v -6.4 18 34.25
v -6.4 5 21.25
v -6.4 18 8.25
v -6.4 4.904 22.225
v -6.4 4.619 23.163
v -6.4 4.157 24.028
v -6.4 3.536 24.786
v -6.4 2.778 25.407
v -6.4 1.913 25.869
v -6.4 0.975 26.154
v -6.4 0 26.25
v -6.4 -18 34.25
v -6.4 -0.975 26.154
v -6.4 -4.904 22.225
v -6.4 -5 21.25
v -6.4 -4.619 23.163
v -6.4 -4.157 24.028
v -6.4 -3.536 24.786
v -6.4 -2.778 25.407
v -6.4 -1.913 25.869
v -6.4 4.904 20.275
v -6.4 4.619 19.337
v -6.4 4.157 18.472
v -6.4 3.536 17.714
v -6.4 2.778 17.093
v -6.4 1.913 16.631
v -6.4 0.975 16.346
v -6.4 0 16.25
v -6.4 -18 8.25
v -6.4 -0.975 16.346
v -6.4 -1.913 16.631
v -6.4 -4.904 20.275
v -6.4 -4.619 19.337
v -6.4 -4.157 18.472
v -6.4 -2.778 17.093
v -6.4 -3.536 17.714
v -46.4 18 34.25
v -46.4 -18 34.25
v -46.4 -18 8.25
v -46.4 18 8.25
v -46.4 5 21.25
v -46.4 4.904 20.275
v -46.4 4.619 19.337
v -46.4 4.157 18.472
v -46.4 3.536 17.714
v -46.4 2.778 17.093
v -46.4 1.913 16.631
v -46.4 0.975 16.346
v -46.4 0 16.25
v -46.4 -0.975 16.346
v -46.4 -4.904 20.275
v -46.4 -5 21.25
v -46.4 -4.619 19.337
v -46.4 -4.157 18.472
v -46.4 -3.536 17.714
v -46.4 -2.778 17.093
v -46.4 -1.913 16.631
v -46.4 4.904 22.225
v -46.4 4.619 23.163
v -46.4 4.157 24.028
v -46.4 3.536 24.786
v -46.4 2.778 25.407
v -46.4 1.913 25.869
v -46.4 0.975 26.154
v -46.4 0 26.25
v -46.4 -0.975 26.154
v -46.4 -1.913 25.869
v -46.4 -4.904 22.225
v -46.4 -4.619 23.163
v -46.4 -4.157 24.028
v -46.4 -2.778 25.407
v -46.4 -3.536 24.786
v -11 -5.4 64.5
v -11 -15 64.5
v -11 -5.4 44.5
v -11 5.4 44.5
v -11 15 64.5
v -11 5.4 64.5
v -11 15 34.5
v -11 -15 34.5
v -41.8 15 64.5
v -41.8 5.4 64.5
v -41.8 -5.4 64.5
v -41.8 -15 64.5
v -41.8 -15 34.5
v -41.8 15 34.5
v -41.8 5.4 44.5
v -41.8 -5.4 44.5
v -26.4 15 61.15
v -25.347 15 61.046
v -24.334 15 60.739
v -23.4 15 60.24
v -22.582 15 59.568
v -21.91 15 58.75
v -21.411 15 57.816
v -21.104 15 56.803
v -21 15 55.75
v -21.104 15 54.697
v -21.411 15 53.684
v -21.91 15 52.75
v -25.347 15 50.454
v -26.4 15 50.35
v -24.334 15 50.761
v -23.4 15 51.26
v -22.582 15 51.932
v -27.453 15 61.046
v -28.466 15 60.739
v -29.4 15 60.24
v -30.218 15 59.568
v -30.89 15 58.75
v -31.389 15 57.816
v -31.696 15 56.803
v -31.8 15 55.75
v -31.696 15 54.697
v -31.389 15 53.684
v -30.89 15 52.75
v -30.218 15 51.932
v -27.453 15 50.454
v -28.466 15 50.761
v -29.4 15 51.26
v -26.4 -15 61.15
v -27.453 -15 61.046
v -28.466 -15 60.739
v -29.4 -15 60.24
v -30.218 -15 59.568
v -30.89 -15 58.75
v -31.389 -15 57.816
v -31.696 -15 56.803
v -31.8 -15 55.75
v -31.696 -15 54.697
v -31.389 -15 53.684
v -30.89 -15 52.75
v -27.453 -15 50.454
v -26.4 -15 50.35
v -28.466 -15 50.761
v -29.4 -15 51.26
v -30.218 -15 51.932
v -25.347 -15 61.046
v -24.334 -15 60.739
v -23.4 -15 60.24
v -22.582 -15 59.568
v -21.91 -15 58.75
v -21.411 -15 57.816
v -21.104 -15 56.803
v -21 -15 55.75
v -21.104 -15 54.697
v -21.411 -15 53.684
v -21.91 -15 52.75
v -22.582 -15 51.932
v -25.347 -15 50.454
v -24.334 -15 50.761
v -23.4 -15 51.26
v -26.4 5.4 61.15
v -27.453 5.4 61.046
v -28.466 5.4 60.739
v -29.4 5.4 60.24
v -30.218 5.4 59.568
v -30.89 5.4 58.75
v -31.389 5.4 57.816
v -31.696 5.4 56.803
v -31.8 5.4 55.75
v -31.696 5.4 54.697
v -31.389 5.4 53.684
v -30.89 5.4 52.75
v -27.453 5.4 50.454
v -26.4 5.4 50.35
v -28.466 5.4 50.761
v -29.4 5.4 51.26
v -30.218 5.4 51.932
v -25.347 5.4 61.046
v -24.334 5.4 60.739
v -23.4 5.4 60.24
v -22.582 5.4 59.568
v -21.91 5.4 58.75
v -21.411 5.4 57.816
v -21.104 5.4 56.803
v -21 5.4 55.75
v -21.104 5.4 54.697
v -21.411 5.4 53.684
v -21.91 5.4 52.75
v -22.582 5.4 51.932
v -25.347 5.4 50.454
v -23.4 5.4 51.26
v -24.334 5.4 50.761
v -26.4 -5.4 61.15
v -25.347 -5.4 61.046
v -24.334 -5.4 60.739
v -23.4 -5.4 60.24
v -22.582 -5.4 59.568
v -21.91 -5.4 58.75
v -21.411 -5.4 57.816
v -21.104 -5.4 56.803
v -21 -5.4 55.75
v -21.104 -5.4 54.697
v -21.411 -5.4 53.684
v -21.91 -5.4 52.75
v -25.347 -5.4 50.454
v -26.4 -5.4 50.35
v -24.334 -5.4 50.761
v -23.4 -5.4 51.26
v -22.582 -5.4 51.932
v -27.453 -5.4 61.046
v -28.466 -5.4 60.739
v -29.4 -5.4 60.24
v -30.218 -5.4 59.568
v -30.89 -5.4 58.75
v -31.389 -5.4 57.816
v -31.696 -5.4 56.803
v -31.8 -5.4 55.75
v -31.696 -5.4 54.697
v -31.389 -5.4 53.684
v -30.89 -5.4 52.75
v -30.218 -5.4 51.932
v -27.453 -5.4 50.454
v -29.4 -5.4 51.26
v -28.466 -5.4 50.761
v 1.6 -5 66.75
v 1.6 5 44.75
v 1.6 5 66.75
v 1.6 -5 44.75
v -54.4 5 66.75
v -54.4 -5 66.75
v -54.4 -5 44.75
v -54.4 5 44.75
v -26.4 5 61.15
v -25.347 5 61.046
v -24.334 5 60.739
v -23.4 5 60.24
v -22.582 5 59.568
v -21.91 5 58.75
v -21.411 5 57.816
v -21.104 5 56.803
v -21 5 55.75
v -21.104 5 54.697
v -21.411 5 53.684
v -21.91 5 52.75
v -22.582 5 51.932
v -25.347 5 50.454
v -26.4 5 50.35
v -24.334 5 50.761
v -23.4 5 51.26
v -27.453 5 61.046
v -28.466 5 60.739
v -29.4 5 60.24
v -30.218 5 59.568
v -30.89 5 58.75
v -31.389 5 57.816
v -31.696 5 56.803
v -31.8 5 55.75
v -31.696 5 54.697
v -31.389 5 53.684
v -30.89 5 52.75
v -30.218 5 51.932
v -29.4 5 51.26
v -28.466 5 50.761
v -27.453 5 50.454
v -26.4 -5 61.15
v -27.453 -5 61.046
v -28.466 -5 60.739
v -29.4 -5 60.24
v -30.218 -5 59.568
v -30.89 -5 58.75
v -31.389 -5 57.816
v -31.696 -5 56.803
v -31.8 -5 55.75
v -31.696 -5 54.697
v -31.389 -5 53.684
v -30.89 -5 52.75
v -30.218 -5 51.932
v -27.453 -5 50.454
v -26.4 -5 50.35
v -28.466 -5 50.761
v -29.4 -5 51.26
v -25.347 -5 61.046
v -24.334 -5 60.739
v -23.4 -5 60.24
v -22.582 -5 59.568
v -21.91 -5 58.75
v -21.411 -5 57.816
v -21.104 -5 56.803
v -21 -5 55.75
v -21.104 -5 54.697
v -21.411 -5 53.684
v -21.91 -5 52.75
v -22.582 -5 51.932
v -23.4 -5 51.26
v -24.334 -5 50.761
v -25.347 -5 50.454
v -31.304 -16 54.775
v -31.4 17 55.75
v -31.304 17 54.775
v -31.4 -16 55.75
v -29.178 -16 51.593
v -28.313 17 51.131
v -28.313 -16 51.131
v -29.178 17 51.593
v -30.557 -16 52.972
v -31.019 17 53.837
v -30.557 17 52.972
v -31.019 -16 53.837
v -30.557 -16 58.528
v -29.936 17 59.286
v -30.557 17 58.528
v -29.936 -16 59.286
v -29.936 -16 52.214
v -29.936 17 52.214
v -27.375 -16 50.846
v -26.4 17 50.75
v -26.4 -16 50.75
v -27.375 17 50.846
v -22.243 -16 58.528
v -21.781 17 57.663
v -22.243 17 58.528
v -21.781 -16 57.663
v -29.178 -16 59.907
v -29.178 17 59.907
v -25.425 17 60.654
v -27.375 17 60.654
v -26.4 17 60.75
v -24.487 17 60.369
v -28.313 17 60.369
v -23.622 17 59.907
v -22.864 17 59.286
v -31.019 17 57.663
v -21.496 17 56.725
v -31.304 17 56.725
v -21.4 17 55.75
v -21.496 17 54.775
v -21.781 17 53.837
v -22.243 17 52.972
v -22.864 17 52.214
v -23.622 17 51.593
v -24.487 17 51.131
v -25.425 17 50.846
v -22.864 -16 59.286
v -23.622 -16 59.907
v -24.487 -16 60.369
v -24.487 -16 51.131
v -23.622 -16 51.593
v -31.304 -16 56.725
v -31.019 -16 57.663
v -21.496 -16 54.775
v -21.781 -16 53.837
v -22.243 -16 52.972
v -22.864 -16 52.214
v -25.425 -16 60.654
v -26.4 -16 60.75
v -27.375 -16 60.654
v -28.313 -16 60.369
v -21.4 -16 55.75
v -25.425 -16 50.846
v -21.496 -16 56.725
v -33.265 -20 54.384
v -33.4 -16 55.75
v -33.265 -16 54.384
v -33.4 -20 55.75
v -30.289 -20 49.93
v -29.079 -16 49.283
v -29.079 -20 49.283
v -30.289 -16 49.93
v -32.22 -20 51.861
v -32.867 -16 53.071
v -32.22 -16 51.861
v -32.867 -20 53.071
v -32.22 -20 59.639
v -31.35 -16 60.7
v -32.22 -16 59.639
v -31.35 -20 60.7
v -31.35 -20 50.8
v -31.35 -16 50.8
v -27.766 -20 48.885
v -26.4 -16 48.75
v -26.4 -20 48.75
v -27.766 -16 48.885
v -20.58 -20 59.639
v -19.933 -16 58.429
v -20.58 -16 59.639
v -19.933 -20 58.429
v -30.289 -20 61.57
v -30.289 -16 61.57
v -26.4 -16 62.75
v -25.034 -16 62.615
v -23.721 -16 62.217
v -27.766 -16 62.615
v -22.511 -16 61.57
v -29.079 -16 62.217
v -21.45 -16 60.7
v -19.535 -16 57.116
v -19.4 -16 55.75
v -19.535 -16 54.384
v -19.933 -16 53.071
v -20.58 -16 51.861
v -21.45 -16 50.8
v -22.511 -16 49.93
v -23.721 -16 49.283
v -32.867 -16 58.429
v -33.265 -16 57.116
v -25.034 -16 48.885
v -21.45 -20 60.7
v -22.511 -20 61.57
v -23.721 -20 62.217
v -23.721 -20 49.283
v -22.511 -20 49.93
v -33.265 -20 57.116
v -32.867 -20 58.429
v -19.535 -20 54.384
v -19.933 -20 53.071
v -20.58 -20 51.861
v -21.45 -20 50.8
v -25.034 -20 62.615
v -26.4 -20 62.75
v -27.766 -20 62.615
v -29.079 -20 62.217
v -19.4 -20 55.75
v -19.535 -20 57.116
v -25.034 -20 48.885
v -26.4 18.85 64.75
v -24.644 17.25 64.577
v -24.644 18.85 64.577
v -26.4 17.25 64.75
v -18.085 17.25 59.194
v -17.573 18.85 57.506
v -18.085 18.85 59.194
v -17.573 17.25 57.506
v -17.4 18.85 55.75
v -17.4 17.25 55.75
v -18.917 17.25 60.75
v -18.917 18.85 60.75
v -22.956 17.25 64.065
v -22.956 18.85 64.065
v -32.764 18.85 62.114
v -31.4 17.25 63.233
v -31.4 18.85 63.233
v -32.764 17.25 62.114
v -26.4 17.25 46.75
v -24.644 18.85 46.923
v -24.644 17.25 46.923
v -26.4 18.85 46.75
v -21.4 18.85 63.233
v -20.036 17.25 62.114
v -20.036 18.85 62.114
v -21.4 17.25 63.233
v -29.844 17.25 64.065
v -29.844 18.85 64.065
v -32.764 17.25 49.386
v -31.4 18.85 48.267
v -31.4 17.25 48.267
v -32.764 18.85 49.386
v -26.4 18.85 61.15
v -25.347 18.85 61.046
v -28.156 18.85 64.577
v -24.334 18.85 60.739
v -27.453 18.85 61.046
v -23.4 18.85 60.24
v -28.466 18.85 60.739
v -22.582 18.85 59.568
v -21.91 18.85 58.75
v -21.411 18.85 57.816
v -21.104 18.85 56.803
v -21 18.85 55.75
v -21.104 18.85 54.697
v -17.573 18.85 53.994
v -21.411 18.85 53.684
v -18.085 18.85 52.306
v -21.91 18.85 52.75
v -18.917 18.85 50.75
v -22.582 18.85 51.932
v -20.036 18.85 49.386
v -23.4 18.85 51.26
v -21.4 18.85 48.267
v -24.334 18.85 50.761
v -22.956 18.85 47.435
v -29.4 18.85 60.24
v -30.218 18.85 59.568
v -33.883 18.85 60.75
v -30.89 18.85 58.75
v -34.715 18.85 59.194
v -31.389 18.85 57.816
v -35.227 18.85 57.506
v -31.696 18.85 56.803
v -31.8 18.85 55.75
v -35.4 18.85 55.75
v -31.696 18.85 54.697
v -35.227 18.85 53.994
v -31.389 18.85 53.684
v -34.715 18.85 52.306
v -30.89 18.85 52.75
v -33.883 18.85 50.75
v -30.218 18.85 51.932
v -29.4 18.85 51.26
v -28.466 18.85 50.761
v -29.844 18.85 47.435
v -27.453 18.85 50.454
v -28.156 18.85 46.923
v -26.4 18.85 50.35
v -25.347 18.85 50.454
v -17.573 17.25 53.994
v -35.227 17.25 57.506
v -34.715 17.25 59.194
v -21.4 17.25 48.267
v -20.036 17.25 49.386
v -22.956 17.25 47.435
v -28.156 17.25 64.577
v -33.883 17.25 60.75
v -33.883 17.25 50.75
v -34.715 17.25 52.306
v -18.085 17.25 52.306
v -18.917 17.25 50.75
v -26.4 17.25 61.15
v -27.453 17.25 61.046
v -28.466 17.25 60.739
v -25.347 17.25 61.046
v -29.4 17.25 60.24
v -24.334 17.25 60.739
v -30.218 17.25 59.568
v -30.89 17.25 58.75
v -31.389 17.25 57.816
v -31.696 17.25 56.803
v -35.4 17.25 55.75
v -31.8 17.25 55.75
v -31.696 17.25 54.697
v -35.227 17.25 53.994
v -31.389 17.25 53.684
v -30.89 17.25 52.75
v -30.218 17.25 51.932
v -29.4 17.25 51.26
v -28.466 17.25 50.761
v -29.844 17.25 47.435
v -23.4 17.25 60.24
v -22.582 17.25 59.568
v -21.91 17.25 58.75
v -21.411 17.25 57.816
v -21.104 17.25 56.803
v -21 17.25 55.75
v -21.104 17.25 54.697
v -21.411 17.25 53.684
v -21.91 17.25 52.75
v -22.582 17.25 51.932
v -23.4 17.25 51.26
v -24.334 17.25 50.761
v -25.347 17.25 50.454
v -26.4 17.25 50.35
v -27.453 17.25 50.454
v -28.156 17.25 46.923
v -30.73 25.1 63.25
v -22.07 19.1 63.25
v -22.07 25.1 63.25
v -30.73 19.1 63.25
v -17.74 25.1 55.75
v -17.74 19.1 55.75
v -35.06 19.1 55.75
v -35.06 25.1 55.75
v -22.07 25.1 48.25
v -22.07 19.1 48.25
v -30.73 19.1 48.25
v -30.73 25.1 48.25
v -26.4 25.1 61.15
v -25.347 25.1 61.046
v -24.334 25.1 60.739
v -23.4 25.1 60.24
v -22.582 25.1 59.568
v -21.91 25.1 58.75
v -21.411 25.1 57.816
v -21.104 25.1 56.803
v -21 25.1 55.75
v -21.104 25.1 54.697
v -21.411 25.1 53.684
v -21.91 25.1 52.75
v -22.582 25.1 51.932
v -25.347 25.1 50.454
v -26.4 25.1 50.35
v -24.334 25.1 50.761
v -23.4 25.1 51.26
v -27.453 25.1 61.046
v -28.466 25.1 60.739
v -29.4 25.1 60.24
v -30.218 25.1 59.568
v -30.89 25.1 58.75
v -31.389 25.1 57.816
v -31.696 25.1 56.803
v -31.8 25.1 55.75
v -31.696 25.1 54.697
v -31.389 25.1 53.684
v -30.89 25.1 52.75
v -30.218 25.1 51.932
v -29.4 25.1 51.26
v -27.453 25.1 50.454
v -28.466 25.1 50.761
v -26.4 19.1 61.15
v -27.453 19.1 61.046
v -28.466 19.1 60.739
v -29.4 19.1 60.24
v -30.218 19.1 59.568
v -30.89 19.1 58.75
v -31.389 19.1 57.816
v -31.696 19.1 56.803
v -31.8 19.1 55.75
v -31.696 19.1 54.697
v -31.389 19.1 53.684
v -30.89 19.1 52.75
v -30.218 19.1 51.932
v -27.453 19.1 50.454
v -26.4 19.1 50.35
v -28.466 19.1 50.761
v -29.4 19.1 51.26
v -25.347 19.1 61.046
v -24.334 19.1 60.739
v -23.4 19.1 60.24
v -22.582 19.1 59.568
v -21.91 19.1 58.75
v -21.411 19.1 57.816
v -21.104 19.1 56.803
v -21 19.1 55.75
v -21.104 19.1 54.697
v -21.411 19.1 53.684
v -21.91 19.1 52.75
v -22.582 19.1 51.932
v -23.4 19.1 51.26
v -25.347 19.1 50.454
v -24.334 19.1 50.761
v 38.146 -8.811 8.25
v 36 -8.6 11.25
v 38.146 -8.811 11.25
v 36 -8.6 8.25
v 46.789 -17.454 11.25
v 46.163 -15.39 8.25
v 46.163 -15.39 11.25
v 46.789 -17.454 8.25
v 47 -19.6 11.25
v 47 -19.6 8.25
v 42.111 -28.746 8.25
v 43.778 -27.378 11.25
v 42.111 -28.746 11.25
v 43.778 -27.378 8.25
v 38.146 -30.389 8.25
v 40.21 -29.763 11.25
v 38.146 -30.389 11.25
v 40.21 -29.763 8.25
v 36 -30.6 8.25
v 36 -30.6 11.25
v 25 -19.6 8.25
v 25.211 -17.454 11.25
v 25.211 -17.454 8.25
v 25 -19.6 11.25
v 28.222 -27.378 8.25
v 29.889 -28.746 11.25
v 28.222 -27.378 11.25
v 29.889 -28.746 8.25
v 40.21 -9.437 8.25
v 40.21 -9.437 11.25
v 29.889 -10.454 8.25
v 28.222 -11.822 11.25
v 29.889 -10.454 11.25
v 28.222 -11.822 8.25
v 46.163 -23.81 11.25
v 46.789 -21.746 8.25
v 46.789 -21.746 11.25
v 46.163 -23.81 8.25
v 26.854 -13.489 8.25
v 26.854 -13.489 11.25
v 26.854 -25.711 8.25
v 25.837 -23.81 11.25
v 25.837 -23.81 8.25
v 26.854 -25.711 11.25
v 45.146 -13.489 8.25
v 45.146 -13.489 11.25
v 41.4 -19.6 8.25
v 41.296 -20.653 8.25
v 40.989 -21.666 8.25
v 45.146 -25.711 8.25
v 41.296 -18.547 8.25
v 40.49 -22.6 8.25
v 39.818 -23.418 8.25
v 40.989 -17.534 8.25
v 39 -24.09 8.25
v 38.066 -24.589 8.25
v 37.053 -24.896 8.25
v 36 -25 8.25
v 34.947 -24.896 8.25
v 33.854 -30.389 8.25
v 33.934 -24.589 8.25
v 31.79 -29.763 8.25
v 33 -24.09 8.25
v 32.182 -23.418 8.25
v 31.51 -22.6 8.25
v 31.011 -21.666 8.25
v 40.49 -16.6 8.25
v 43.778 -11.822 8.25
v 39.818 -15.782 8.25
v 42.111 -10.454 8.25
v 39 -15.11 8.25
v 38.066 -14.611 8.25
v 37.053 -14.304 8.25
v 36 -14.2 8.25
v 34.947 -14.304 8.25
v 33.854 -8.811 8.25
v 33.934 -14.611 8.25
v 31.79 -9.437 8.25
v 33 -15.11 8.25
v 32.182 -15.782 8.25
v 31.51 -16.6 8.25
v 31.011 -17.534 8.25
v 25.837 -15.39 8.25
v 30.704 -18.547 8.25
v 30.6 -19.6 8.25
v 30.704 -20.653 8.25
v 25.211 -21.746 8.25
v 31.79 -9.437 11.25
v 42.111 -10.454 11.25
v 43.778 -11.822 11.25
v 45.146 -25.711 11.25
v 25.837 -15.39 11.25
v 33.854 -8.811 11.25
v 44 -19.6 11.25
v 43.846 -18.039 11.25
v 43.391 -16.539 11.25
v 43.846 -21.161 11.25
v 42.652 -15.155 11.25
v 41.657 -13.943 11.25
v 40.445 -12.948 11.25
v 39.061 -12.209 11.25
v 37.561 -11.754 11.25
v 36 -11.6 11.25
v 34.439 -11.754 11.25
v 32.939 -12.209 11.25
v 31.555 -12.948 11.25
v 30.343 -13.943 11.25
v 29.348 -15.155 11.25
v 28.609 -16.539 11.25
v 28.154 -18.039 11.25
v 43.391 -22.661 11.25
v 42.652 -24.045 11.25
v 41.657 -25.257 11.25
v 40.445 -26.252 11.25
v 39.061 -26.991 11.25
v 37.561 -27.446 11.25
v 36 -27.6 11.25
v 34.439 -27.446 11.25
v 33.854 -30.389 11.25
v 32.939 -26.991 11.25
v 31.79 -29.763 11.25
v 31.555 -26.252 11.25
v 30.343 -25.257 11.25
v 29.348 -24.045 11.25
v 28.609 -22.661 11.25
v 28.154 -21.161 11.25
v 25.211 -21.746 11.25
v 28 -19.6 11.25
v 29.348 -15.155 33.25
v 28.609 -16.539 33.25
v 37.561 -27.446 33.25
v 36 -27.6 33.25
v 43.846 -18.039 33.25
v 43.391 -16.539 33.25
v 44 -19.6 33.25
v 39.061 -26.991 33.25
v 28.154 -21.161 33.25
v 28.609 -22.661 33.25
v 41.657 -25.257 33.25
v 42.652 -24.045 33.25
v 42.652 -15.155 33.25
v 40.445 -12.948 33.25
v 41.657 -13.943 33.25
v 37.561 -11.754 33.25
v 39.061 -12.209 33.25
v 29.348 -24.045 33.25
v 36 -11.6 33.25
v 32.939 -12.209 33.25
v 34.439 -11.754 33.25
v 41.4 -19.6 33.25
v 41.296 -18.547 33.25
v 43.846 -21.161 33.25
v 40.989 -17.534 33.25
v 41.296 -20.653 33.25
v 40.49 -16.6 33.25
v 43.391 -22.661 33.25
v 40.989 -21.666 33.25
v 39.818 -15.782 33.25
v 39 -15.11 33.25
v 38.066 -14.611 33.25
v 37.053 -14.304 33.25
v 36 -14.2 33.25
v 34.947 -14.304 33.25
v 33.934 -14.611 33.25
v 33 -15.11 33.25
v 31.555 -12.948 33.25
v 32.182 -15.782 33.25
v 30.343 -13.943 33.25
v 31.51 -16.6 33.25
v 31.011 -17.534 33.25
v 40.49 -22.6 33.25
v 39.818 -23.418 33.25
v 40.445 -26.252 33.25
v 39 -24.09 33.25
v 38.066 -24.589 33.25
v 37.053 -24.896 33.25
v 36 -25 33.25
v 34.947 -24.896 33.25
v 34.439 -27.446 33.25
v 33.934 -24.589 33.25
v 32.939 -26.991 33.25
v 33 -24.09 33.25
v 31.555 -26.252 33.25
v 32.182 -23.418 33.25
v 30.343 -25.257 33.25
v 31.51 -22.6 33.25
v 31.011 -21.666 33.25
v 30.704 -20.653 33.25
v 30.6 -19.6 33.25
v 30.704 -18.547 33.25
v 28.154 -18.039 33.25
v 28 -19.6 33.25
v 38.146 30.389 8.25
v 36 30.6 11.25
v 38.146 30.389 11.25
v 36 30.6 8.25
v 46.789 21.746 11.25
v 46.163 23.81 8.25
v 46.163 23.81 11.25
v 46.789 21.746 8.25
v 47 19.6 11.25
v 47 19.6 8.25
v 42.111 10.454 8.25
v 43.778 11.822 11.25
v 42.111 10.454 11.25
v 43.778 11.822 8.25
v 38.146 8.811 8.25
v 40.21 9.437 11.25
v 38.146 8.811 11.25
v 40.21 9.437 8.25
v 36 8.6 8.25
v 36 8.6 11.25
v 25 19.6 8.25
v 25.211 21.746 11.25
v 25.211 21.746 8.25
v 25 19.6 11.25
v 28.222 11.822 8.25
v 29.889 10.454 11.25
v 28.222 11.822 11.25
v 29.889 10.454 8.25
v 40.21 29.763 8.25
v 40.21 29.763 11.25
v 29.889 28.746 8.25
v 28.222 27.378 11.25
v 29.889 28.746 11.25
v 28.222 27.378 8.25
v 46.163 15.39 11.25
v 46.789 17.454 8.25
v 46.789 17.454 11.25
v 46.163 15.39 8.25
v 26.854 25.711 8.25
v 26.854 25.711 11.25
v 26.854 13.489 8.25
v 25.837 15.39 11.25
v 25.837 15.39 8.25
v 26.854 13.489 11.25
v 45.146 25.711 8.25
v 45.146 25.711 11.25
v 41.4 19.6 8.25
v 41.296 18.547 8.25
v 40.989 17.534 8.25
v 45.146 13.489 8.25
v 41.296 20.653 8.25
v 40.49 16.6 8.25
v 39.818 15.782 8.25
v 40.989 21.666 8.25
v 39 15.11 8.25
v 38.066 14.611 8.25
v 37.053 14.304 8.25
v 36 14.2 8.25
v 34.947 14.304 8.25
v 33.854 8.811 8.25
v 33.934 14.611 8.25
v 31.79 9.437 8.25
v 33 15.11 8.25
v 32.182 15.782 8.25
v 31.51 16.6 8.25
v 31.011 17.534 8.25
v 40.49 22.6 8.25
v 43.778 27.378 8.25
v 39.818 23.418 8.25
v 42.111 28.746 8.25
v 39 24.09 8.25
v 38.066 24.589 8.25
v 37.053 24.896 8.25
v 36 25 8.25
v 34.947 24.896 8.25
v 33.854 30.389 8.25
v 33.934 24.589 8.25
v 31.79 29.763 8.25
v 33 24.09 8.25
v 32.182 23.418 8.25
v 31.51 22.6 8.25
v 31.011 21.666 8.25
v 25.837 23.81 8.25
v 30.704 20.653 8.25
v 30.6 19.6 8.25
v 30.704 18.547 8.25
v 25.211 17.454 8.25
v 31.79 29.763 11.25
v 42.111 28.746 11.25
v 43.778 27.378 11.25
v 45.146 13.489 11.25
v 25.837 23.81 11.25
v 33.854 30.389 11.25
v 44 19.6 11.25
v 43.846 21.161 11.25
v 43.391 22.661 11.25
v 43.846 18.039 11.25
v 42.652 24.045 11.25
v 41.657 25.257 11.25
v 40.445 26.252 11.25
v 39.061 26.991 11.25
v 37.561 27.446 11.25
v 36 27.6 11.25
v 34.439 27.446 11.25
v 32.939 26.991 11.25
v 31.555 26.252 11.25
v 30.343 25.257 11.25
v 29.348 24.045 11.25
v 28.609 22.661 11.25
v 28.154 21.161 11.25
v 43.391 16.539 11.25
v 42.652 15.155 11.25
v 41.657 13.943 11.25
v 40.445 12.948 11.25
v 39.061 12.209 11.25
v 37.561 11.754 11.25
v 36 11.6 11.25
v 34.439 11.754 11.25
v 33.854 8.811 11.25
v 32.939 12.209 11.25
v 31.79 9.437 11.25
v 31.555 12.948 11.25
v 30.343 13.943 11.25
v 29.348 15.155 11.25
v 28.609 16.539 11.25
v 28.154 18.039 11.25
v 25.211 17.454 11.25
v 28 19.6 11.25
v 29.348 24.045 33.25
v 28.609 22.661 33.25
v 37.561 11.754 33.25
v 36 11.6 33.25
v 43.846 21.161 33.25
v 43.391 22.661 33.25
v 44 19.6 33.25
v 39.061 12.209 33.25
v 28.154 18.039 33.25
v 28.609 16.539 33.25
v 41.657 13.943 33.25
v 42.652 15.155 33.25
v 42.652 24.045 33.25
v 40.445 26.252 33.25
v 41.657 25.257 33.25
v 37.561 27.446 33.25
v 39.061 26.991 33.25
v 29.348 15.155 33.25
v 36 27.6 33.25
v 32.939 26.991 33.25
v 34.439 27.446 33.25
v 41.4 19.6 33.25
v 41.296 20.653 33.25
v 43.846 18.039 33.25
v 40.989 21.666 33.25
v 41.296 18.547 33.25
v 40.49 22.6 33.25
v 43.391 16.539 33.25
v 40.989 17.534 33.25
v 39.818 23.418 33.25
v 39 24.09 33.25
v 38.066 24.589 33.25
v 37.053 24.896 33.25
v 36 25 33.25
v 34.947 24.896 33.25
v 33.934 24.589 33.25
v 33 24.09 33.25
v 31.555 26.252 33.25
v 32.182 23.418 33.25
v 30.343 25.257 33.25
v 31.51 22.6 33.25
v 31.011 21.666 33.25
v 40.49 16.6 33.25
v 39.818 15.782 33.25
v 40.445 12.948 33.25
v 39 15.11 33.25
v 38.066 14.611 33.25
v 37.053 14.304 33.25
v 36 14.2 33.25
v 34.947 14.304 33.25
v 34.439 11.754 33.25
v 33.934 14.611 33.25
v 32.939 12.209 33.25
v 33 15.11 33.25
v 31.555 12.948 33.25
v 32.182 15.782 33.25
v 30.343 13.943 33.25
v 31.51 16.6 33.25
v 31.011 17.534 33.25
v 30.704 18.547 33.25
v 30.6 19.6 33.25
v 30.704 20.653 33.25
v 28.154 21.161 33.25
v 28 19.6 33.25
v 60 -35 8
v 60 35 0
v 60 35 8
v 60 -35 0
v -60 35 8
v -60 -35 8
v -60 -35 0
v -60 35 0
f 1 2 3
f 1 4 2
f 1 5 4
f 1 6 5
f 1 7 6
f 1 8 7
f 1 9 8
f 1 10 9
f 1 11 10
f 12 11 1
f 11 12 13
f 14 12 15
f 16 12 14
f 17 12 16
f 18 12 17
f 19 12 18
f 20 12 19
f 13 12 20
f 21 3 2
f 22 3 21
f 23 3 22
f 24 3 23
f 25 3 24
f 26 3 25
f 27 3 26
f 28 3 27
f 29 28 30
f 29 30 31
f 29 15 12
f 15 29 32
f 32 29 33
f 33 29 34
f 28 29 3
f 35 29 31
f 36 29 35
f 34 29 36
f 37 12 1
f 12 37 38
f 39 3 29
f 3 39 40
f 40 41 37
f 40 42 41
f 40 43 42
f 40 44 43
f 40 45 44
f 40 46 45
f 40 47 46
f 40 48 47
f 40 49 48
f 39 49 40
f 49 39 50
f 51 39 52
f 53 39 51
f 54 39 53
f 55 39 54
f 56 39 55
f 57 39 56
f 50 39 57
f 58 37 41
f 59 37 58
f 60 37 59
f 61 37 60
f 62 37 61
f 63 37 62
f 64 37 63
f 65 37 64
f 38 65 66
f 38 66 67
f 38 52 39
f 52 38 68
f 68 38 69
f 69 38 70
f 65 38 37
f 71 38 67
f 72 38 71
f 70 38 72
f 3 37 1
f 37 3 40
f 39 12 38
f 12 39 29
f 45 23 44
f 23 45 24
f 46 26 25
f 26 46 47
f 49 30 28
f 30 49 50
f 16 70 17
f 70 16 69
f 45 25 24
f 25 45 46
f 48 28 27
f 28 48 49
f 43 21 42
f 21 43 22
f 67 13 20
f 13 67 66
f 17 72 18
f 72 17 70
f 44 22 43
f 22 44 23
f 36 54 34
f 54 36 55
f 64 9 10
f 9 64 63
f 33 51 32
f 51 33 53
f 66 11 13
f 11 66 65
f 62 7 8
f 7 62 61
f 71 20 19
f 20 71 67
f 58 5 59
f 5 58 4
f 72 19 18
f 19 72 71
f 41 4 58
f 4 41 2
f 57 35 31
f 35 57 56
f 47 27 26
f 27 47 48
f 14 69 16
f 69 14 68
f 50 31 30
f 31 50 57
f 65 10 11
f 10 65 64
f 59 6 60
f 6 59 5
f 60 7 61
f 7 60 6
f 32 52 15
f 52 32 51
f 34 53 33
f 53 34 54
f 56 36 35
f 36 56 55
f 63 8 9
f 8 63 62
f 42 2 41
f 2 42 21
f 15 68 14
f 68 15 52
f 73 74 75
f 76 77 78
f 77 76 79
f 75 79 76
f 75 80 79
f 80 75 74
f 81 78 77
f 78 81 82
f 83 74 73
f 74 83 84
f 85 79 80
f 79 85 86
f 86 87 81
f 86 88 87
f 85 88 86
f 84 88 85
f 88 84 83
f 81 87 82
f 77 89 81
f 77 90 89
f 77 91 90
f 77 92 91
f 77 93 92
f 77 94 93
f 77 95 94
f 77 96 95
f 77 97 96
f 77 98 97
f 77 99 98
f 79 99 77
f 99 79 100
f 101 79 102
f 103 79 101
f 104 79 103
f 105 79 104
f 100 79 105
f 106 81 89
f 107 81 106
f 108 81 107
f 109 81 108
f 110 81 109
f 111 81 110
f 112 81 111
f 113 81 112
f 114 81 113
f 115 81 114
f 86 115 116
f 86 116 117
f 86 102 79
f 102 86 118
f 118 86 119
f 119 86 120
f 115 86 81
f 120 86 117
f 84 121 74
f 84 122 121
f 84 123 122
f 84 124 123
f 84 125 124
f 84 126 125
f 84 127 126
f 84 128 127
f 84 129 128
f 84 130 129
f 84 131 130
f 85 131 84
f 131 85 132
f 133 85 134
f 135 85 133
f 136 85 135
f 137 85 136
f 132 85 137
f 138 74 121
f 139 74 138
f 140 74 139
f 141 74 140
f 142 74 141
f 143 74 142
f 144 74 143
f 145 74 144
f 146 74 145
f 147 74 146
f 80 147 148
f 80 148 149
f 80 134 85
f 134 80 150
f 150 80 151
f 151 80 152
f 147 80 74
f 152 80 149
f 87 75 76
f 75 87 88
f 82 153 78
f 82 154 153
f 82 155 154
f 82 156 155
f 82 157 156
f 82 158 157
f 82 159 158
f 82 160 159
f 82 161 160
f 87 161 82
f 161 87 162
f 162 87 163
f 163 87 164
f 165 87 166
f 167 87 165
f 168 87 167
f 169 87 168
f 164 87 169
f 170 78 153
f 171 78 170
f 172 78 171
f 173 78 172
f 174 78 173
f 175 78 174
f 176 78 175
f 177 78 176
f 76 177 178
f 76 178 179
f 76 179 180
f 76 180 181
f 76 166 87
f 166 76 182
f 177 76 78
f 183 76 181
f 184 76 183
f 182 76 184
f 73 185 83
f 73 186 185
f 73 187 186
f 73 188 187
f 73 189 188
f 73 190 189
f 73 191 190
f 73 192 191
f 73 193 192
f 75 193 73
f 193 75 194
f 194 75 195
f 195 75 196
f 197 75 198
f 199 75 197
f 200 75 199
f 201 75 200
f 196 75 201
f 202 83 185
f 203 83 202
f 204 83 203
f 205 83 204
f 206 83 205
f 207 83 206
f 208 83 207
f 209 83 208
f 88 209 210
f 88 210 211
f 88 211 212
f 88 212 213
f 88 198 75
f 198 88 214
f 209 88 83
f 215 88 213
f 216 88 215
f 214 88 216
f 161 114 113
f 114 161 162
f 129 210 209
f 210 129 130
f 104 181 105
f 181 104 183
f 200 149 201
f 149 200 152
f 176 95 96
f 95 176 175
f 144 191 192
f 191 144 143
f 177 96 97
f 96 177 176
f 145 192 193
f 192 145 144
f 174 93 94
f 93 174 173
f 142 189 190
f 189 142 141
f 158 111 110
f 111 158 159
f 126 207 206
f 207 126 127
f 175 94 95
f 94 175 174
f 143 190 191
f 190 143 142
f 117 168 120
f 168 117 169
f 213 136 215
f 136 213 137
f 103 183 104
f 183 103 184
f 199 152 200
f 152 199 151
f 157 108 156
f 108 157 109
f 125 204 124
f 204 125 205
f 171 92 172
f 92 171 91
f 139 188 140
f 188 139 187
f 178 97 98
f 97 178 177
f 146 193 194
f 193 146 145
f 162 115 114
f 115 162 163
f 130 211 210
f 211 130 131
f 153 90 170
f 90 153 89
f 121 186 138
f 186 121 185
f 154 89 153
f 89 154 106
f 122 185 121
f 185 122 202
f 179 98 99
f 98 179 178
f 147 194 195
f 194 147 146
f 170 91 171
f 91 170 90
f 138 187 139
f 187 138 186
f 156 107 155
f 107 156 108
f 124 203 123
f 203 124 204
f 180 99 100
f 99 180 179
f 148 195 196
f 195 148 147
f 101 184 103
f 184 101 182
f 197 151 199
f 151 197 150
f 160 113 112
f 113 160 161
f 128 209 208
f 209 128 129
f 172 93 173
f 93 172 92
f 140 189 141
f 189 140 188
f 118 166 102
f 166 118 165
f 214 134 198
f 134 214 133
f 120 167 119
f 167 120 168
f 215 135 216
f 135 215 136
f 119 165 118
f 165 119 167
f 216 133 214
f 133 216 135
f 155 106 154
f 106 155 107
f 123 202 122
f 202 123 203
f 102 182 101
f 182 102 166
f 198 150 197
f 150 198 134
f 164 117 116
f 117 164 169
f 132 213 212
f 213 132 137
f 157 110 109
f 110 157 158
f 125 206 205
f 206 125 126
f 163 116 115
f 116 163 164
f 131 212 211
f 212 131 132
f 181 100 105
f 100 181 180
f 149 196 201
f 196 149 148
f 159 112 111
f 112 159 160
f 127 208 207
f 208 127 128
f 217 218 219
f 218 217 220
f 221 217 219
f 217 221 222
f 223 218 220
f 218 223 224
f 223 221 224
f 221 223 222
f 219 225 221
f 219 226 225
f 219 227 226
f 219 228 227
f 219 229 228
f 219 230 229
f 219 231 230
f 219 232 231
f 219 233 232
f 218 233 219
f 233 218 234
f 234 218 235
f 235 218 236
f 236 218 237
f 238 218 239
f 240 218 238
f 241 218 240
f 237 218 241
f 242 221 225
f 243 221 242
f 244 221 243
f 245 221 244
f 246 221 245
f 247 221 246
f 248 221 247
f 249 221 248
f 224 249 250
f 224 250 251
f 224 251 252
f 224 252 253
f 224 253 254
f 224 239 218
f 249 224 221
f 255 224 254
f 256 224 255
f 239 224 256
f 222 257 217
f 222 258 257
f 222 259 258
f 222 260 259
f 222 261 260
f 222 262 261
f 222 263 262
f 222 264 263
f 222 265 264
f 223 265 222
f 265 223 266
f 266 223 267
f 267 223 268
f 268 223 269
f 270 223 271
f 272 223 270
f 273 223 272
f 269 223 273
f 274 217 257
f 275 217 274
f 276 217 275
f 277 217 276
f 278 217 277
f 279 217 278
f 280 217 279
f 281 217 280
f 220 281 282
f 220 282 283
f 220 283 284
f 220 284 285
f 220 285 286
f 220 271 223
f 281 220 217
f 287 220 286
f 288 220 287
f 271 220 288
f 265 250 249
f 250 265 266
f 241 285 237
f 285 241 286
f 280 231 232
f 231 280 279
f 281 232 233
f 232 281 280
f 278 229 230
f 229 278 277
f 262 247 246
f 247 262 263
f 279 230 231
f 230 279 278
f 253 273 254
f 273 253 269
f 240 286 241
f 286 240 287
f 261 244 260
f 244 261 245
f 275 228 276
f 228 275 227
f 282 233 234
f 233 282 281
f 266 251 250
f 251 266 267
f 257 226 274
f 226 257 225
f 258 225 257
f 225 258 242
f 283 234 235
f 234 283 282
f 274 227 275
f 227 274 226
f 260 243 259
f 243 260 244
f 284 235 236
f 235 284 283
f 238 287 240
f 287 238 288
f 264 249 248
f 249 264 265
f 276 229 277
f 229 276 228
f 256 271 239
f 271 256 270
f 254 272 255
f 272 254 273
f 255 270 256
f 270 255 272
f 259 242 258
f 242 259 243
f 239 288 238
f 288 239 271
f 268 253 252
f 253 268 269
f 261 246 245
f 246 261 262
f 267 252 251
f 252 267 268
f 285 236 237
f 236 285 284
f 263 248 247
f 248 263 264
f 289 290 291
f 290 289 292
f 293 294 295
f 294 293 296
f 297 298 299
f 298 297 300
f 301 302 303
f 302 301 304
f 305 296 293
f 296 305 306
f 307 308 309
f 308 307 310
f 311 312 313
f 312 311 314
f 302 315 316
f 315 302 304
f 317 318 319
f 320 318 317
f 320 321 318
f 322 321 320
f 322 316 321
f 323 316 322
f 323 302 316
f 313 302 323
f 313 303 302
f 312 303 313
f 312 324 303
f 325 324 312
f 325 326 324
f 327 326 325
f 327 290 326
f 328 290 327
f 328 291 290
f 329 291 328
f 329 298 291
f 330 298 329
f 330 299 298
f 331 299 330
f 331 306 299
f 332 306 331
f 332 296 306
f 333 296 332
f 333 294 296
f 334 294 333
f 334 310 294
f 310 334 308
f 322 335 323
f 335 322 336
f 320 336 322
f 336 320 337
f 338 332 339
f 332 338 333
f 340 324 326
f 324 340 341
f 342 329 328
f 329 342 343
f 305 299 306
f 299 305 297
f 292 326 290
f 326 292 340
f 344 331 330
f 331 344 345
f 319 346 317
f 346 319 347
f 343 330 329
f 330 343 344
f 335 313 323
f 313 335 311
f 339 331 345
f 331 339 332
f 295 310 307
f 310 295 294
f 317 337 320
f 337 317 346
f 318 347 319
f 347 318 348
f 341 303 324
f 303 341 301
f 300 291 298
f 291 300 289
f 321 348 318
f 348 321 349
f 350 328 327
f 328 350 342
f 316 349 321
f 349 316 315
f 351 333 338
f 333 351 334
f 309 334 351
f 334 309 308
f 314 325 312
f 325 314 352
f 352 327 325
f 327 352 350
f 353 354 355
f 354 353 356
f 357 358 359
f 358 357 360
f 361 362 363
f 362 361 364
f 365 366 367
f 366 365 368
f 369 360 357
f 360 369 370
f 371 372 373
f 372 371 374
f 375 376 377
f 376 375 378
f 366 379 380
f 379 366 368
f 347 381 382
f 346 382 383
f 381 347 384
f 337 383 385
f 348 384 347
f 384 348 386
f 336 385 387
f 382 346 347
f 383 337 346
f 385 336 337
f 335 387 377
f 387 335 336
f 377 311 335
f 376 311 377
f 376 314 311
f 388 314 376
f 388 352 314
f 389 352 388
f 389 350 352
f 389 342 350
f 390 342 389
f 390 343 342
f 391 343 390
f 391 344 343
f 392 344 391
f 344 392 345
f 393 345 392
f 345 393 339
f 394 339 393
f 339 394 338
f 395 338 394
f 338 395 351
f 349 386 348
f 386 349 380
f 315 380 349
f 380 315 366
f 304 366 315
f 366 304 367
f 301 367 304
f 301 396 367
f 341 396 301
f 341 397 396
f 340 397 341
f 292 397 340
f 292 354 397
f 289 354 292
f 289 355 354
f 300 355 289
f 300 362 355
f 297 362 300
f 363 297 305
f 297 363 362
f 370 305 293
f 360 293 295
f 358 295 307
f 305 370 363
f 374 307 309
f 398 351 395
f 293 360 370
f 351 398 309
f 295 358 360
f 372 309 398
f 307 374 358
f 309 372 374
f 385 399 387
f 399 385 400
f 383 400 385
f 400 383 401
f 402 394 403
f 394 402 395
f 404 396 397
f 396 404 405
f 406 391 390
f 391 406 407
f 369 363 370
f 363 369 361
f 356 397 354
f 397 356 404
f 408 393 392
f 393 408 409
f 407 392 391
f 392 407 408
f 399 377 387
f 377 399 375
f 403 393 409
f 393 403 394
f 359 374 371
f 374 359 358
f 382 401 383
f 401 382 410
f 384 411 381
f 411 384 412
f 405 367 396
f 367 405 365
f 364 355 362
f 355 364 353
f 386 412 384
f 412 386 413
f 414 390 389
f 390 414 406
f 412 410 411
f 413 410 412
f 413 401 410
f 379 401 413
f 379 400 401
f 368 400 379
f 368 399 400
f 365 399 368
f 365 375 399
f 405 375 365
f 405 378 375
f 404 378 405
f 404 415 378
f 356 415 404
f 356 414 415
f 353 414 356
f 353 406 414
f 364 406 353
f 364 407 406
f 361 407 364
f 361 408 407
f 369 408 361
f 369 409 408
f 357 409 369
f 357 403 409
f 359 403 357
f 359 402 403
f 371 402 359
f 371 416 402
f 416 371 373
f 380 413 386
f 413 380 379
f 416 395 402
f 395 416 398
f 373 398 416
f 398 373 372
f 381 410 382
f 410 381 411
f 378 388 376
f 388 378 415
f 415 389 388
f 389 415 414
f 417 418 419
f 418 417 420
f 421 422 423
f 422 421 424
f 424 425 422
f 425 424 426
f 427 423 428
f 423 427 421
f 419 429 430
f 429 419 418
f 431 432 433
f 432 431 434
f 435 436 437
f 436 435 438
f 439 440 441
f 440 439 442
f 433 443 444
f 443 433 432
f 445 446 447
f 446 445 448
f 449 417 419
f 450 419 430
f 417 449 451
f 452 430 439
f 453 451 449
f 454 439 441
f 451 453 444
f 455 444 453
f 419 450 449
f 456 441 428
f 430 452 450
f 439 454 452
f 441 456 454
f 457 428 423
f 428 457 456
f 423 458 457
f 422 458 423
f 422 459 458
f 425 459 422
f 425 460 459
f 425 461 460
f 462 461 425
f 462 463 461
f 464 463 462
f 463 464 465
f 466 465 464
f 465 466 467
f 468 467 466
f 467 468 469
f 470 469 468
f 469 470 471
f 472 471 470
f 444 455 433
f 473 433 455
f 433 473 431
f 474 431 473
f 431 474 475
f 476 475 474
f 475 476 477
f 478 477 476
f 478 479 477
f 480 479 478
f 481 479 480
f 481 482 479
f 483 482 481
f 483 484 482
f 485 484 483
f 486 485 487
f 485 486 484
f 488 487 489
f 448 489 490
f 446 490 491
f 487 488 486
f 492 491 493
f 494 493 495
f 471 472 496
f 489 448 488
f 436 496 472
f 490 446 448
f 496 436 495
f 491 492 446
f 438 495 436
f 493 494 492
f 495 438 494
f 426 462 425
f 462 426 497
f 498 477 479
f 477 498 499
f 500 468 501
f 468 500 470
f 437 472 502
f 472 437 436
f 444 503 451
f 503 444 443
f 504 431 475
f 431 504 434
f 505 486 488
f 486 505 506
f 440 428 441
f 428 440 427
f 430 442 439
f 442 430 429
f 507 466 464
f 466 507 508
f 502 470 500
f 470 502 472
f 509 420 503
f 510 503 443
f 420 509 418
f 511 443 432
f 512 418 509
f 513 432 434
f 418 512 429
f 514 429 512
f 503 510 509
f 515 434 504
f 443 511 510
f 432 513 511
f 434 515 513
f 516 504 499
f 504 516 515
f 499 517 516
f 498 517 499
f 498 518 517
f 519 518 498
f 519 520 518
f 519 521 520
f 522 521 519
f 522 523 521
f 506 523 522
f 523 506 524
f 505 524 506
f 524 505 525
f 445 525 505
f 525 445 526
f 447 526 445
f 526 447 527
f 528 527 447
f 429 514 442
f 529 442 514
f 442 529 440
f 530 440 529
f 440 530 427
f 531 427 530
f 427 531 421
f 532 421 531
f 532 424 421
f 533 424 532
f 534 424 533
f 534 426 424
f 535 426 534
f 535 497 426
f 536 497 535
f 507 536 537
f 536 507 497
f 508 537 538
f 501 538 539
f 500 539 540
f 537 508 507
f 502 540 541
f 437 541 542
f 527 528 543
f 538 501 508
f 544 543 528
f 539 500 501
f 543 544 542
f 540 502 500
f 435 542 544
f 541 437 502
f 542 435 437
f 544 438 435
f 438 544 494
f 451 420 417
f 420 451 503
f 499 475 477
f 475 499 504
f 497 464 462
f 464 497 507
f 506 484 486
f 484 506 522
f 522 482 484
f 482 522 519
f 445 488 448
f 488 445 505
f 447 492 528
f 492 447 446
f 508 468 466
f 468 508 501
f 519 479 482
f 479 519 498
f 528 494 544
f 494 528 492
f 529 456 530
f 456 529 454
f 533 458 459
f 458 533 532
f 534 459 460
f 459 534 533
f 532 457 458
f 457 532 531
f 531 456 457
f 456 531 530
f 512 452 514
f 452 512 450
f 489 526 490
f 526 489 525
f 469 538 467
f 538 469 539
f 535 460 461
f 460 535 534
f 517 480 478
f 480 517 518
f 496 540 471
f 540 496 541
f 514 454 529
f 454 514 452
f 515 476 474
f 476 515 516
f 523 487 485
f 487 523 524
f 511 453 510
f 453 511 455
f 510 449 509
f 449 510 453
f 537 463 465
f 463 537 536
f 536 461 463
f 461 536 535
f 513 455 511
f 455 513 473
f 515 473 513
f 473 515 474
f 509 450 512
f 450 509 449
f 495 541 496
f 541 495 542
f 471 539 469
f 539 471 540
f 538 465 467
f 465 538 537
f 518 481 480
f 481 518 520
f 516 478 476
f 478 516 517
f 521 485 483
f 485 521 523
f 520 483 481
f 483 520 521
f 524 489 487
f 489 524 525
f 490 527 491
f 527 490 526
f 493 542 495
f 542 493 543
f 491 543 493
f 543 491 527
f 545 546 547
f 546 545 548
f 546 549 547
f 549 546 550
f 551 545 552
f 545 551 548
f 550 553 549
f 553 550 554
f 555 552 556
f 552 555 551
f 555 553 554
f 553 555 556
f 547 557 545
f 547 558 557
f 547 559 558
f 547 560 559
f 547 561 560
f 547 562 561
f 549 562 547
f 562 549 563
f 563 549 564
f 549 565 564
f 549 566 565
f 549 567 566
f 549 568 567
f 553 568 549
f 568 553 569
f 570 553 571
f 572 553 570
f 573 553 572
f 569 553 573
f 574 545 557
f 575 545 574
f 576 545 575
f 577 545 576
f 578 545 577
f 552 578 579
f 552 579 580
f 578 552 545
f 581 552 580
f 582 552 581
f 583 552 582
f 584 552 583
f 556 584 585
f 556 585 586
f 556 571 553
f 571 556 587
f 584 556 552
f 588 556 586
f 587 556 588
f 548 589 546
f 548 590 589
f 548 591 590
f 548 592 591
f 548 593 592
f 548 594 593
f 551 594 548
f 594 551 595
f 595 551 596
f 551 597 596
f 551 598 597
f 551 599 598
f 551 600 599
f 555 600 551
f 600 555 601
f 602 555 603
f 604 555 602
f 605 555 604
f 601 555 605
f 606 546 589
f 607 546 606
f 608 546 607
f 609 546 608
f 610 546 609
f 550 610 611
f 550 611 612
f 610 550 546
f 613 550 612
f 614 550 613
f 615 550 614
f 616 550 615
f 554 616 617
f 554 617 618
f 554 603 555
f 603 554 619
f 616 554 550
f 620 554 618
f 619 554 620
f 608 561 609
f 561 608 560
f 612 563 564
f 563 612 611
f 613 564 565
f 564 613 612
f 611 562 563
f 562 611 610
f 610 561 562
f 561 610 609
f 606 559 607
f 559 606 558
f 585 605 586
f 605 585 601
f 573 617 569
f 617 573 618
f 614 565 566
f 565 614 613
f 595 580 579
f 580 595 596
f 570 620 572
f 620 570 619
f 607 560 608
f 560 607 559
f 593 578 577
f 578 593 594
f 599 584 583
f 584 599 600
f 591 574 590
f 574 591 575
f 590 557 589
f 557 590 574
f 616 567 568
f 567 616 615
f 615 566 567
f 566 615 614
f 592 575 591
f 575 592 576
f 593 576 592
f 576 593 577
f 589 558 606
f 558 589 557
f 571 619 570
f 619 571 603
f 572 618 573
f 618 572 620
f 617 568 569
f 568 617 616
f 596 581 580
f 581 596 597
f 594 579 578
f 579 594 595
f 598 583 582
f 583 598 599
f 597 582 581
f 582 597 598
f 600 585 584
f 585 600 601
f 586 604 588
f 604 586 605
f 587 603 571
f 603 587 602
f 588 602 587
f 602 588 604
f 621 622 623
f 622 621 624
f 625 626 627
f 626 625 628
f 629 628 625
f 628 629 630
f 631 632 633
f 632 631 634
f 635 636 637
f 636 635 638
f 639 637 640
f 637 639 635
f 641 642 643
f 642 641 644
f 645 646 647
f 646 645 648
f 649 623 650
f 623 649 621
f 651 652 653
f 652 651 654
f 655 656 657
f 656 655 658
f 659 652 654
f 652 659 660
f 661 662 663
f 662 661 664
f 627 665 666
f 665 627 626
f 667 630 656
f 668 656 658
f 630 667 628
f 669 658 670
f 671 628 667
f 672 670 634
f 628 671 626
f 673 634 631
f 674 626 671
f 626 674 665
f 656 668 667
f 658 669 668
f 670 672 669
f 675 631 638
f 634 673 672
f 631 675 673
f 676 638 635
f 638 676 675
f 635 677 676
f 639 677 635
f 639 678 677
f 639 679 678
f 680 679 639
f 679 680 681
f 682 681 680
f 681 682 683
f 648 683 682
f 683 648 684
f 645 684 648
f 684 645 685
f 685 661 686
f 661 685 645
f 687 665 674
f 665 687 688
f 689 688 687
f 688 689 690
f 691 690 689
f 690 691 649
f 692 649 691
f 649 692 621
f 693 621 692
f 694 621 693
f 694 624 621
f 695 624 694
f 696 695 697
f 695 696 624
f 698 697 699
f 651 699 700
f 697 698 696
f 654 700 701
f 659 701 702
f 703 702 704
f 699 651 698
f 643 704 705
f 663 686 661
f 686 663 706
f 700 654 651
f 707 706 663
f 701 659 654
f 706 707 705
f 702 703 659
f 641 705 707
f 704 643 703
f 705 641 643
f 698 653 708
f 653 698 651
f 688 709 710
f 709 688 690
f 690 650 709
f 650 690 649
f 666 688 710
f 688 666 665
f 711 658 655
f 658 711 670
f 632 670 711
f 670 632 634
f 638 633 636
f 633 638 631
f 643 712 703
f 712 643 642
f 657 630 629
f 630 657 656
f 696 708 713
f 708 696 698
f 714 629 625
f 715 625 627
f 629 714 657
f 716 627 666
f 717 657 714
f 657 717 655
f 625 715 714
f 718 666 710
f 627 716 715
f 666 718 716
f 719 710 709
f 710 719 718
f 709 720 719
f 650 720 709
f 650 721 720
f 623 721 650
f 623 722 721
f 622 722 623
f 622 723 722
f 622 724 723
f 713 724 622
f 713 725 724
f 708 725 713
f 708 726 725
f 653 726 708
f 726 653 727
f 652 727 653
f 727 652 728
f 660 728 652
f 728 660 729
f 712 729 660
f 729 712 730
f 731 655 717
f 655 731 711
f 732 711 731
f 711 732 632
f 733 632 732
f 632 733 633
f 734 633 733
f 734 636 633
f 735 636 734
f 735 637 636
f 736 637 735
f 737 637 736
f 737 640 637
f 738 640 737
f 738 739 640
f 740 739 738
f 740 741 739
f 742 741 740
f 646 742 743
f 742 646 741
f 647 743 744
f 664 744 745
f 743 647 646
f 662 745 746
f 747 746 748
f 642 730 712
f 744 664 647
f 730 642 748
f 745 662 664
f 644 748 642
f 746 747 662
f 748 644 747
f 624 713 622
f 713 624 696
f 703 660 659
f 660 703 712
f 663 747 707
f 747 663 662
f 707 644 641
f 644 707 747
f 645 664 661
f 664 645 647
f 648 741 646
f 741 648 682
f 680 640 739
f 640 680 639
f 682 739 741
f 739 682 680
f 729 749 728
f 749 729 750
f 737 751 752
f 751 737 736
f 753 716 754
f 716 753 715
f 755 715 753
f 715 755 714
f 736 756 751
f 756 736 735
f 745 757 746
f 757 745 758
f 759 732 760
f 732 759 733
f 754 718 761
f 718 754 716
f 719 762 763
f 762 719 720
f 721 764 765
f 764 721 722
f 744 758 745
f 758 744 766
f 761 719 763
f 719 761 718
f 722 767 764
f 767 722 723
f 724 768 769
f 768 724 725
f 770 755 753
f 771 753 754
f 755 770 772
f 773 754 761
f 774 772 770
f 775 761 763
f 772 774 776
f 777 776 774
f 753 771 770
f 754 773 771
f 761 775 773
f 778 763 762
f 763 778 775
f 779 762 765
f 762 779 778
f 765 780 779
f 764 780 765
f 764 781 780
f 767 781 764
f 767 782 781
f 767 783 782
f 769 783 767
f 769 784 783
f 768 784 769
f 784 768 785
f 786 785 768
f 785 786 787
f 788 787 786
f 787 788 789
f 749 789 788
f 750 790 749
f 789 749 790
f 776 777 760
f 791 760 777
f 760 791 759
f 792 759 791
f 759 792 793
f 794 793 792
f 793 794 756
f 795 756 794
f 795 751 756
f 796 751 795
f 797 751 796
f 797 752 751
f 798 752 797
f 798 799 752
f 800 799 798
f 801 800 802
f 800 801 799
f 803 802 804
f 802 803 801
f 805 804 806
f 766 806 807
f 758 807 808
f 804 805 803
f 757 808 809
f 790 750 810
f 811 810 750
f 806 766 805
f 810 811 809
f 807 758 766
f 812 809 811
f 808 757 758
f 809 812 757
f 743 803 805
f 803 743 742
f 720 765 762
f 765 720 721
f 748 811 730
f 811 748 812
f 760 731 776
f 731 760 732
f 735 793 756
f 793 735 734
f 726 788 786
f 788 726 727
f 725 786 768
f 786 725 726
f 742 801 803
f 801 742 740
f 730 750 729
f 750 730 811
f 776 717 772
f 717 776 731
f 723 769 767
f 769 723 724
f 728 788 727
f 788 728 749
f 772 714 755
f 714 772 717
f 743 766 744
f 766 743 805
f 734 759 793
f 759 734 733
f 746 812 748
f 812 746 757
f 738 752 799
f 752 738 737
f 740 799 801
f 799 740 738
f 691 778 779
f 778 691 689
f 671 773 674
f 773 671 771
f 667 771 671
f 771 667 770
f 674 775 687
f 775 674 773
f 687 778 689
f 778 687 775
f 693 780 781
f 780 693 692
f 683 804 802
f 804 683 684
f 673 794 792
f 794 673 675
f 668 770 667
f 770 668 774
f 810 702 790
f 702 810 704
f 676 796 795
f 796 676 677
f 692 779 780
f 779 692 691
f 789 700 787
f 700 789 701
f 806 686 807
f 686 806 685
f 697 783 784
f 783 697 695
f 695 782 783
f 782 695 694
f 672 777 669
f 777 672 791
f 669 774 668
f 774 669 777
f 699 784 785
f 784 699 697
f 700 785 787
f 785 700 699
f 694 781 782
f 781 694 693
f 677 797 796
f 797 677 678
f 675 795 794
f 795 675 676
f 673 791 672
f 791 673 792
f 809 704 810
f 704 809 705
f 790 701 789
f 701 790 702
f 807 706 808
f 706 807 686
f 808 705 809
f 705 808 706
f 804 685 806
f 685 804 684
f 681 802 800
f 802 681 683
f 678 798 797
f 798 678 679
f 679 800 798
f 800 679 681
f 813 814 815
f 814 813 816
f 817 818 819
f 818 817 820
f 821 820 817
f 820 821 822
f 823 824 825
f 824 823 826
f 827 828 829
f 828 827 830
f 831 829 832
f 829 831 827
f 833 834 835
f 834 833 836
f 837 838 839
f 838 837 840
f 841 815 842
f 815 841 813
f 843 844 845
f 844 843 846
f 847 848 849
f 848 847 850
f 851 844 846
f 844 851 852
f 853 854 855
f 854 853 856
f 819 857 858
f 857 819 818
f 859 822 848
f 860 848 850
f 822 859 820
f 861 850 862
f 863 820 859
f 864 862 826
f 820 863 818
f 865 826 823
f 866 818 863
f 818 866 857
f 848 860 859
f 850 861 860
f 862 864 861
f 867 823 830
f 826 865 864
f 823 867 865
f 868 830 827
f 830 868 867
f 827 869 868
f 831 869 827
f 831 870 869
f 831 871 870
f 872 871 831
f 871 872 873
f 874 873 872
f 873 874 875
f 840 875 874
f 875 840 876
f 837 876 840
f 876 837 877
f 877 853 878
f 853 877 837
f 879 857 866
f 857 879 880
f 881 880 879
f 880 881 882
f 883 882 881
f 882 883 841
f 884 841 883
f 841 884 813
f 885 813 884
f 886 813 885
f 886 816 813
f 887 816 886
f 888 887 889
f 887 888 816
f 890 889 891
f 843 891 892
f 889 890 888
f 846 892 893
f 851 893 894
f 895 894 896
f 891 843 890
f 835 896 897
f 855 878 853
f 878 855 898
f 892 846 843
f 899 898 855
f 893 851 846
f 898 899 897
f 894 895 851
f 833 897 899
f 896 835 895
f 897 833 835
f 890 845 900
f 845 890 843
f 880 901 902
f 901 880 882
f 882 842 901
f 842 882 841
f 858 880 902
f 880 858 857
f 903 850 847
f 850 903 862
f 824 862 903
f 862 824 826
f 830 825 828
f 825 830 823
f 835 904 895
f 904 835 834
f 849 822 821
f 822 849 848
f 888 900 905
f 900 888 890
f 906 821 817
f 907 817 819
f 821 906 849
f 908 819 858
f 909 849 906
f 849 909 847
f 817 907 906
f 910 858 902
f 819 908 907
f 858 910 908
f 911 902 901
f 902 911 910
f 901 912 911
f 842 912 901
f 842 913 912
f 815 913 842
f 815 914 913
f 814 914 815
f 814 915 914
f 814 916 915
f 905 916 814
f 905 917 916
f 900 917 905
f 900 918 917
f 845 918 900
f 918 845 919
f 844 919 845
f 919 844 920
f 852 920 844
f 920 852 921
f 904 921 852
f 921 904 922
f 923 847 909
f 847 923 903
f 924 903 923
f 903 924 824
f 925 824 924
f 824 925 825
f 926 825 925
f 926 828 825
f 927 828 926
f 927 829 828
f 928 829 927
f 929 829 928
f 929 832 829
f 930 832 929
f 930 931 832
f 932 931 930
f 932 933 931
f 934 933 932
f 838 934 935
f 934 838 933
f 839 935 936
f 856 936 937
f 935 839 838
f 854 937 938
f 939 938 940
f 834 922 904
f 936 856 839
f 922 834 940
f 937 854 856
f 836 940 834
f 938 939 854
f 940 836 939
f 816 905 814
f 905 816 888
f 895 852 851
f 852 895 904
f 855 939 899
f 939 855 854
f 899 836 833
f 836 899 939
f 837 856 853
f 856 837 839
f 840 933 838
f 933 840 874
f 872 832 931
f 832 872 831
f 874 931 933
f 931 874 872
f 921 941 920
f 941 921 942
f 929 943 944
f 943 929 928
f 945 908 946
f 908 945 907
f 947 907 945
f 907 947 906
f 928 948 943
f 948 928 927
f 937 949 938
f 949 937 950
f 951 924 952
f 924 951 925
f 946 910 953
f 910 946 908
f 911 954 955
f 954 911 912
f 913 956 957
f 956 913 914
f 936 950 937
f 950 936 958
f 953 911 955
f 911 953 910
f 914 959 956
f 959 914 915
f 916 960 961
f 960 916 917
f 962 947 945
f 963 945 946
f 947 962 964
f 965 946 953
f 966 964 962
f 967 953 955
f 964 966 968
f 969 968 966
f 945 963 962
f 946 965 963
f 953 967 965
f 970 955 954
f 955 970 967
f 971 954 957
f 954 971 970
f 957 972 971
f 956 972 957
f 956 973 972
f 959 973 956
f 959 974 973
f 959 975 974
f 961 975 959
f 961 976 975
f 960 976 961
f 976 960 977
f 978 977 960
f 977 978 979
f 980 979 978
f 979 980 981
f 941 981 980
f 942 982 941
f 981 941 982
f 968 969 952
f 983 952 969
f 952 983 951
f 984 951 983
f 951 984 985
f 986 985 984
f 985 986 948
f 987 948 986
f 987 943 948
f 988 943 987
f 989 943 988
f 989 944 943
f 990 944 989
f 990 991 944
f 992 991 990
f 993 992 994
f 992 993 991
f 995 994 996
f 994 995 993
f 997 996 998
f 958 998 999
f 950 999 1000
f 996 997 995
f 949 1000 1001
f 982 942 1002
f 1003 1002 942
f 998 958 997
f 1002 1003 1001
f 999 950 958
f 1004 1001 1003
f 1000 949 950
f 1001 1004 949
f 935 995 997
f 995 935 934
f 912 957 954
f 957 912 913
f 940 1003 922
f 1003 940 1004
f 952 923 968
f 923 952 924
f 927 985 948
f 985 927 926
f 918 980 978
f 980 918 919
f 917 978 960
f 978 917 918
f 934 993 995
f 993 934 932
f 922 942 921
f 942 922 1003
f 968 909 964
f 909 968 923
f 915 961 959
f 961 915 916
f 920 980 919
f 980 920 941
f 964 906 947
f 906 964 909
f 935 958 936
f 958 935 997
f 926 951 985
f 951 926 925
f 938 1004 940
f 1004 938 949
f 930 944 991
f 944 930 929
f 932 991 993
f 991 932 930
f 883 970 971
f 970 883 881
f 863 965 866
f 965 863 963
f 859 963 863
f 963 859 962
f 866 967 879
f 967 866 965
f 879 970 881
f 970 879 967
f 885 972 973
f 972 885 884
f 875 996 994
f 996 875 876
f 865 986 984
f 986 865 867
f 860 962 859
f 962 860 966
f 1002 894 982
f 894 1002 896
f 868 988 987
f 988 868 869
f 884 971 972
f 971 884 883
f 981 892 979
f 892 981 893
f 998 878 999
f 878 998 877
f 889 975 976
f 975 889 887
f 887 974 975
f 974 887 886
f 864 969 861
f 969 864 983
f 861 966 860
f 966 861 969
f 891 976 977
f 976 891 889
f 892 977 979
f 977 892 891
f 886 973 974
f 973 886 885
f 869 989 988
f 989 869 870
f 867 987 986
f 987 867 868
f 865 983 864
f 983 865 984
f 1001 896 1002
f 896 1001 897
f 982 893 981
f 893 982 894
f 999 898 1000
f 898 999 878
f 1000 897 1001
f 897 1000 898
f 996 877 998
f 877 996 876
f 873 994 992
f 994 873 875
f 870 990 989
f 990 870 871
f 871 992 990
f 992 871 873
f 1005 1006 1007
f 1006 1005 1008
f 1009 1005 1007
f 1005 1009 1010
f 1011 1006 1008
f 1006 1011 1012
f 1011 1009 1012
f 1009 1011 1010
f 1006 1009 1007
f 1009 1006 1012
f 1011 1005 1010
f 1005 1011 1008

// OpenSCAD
$fn = 32;

// ------------------------------------------------------------------------
// Indexing jig: plate 120 x 70 mm, pin d10
// Every part is its own module, assembly() places every instance.
// ------------------------------------------------------------------------

// --- part 1 ---
module jig_plate() {
  difference() {
    translate([-60, -35, 0]) cube([120, 70, 8]);
  }
}

// --- part 2 ---
module locator_block() {
  difference() {
    translate([-20, -18, 0]) cube([40, 36, 26]);
    translate([0, 0, 13]) rotate([0, 90, 0]) cylinder(h = 42, d = 10, center = true);
  }
}

// --- part 3 ---
module index_fork() {
  difference() {
    translate([-15.4, -15, 0]) cube([30.8, 30, 30]);
    translate([-16.4, -5.4, 10]) cube([32.8, 10.8, 21]);
    translate([0, 0, 21.25]) rotate([90, 0, 0]) cylinder(h = 32, d = 10.8, center = true);
  }
}

// --- part 4 ---
module index_arm() {
  difference() {
    translate([-28, -5, 0]) cube([56, 10, 22]);
    translate([0, 0, 11]) rotate([90, 0, 0]) cylinder(h = 12, d = 10.8, center = true);
  }
}

// --- part 5 ---
module index_pin() {
  rotate([0, 90, 0]) cylinder(h = 34, d = 10, center = true);
  translate([-20, 0, 0]) rotate([0, 90, 0]) cylinder(h = 4, d = 14);
}

// --- part 6 ---
module pin_washer() {
  difference() {
      translate([0, 0, 0]) cylinder(h = 1.6, d = 18);
      translate([0, 0, -1]) cylinder(h = 3.6, d = 10.8);
    }
}

// --- part 7 ---
module lock_nut() {
  difference() {
    linear_extrude(height = 6) polygon(points = [[8.66, 0], [4.33, 7.5], [-4.33, 7.5], [-8.66, 0], [-4.33, -7.5], [4.33, -7.5]]);
    translate([0, 0, -1]) cylinder(h = 8, d = 10.8);
  }
}

// --- part 8 ---
module guide_bush_a() {
  difference() {
    union() {
      cylinder(h = 3, d = 22);
      translate([0, 0, 3]) cylinder(h = 22, d = 16);
    }
    translate([0, 0, -1]) cylinder(h = 27, d = 10.8);
  }
}

// --- part 9 ---
module guide_bush_b() {
  difference() {
    union() {
      cylinder(h = 3, d = 22);
      translate([0, 0, 3]) cylinder(h = 22, d = 16);
    }
    translate([0, 0, -1]) cylinder(h = 27, d = 10.8);
  }
}

// --- assembly ---
module assembly() {
  color([0.80, 0.24, 0.20]) translate([0, 0, 0]) rotate([0, 0, 0]) jig_plate();
  color([0.20, 0.45, 0.75]) translate([-26.4, 0, 8.25]) rotate([0, 0, 0]) locator_block();
  color([0.25, 0.62, 0.32]) translate([-26.4, 0, 34.5]) rotate([0, 0, 0]) index_fork();
  color([0.92, 0.70, 0.18]) translate([-26.4, 0, 44.75]) rotate([0, 0, 0]) index_arm();
  color([0.58, 0.35, 0.70]) translate([-26.4, 0, 55.75]) rotate([0, 0, 90]) index_pin();
  color([0.16, 0.66, 0.66]) translate([-26.4, 18.85, 55.75]) rotate([90, 0, 0]) pin_washer();
  color([0.85, 0.48, 0.18]) translate([-26.4, 25.1, 55.75]) rotate([90, 0, 0]) lock_nut();
  color([0.55, 0.60, 0.65]) translate([36, -19.6, 8.25]) rotate([0, 0, 0]) guide_bush_a();
  color([0.75, 0.30, 0.55]) translate([36, 19.6, 8.25]) rotate([0, 0, 0]) guide_bush_b();
}

assembly();
